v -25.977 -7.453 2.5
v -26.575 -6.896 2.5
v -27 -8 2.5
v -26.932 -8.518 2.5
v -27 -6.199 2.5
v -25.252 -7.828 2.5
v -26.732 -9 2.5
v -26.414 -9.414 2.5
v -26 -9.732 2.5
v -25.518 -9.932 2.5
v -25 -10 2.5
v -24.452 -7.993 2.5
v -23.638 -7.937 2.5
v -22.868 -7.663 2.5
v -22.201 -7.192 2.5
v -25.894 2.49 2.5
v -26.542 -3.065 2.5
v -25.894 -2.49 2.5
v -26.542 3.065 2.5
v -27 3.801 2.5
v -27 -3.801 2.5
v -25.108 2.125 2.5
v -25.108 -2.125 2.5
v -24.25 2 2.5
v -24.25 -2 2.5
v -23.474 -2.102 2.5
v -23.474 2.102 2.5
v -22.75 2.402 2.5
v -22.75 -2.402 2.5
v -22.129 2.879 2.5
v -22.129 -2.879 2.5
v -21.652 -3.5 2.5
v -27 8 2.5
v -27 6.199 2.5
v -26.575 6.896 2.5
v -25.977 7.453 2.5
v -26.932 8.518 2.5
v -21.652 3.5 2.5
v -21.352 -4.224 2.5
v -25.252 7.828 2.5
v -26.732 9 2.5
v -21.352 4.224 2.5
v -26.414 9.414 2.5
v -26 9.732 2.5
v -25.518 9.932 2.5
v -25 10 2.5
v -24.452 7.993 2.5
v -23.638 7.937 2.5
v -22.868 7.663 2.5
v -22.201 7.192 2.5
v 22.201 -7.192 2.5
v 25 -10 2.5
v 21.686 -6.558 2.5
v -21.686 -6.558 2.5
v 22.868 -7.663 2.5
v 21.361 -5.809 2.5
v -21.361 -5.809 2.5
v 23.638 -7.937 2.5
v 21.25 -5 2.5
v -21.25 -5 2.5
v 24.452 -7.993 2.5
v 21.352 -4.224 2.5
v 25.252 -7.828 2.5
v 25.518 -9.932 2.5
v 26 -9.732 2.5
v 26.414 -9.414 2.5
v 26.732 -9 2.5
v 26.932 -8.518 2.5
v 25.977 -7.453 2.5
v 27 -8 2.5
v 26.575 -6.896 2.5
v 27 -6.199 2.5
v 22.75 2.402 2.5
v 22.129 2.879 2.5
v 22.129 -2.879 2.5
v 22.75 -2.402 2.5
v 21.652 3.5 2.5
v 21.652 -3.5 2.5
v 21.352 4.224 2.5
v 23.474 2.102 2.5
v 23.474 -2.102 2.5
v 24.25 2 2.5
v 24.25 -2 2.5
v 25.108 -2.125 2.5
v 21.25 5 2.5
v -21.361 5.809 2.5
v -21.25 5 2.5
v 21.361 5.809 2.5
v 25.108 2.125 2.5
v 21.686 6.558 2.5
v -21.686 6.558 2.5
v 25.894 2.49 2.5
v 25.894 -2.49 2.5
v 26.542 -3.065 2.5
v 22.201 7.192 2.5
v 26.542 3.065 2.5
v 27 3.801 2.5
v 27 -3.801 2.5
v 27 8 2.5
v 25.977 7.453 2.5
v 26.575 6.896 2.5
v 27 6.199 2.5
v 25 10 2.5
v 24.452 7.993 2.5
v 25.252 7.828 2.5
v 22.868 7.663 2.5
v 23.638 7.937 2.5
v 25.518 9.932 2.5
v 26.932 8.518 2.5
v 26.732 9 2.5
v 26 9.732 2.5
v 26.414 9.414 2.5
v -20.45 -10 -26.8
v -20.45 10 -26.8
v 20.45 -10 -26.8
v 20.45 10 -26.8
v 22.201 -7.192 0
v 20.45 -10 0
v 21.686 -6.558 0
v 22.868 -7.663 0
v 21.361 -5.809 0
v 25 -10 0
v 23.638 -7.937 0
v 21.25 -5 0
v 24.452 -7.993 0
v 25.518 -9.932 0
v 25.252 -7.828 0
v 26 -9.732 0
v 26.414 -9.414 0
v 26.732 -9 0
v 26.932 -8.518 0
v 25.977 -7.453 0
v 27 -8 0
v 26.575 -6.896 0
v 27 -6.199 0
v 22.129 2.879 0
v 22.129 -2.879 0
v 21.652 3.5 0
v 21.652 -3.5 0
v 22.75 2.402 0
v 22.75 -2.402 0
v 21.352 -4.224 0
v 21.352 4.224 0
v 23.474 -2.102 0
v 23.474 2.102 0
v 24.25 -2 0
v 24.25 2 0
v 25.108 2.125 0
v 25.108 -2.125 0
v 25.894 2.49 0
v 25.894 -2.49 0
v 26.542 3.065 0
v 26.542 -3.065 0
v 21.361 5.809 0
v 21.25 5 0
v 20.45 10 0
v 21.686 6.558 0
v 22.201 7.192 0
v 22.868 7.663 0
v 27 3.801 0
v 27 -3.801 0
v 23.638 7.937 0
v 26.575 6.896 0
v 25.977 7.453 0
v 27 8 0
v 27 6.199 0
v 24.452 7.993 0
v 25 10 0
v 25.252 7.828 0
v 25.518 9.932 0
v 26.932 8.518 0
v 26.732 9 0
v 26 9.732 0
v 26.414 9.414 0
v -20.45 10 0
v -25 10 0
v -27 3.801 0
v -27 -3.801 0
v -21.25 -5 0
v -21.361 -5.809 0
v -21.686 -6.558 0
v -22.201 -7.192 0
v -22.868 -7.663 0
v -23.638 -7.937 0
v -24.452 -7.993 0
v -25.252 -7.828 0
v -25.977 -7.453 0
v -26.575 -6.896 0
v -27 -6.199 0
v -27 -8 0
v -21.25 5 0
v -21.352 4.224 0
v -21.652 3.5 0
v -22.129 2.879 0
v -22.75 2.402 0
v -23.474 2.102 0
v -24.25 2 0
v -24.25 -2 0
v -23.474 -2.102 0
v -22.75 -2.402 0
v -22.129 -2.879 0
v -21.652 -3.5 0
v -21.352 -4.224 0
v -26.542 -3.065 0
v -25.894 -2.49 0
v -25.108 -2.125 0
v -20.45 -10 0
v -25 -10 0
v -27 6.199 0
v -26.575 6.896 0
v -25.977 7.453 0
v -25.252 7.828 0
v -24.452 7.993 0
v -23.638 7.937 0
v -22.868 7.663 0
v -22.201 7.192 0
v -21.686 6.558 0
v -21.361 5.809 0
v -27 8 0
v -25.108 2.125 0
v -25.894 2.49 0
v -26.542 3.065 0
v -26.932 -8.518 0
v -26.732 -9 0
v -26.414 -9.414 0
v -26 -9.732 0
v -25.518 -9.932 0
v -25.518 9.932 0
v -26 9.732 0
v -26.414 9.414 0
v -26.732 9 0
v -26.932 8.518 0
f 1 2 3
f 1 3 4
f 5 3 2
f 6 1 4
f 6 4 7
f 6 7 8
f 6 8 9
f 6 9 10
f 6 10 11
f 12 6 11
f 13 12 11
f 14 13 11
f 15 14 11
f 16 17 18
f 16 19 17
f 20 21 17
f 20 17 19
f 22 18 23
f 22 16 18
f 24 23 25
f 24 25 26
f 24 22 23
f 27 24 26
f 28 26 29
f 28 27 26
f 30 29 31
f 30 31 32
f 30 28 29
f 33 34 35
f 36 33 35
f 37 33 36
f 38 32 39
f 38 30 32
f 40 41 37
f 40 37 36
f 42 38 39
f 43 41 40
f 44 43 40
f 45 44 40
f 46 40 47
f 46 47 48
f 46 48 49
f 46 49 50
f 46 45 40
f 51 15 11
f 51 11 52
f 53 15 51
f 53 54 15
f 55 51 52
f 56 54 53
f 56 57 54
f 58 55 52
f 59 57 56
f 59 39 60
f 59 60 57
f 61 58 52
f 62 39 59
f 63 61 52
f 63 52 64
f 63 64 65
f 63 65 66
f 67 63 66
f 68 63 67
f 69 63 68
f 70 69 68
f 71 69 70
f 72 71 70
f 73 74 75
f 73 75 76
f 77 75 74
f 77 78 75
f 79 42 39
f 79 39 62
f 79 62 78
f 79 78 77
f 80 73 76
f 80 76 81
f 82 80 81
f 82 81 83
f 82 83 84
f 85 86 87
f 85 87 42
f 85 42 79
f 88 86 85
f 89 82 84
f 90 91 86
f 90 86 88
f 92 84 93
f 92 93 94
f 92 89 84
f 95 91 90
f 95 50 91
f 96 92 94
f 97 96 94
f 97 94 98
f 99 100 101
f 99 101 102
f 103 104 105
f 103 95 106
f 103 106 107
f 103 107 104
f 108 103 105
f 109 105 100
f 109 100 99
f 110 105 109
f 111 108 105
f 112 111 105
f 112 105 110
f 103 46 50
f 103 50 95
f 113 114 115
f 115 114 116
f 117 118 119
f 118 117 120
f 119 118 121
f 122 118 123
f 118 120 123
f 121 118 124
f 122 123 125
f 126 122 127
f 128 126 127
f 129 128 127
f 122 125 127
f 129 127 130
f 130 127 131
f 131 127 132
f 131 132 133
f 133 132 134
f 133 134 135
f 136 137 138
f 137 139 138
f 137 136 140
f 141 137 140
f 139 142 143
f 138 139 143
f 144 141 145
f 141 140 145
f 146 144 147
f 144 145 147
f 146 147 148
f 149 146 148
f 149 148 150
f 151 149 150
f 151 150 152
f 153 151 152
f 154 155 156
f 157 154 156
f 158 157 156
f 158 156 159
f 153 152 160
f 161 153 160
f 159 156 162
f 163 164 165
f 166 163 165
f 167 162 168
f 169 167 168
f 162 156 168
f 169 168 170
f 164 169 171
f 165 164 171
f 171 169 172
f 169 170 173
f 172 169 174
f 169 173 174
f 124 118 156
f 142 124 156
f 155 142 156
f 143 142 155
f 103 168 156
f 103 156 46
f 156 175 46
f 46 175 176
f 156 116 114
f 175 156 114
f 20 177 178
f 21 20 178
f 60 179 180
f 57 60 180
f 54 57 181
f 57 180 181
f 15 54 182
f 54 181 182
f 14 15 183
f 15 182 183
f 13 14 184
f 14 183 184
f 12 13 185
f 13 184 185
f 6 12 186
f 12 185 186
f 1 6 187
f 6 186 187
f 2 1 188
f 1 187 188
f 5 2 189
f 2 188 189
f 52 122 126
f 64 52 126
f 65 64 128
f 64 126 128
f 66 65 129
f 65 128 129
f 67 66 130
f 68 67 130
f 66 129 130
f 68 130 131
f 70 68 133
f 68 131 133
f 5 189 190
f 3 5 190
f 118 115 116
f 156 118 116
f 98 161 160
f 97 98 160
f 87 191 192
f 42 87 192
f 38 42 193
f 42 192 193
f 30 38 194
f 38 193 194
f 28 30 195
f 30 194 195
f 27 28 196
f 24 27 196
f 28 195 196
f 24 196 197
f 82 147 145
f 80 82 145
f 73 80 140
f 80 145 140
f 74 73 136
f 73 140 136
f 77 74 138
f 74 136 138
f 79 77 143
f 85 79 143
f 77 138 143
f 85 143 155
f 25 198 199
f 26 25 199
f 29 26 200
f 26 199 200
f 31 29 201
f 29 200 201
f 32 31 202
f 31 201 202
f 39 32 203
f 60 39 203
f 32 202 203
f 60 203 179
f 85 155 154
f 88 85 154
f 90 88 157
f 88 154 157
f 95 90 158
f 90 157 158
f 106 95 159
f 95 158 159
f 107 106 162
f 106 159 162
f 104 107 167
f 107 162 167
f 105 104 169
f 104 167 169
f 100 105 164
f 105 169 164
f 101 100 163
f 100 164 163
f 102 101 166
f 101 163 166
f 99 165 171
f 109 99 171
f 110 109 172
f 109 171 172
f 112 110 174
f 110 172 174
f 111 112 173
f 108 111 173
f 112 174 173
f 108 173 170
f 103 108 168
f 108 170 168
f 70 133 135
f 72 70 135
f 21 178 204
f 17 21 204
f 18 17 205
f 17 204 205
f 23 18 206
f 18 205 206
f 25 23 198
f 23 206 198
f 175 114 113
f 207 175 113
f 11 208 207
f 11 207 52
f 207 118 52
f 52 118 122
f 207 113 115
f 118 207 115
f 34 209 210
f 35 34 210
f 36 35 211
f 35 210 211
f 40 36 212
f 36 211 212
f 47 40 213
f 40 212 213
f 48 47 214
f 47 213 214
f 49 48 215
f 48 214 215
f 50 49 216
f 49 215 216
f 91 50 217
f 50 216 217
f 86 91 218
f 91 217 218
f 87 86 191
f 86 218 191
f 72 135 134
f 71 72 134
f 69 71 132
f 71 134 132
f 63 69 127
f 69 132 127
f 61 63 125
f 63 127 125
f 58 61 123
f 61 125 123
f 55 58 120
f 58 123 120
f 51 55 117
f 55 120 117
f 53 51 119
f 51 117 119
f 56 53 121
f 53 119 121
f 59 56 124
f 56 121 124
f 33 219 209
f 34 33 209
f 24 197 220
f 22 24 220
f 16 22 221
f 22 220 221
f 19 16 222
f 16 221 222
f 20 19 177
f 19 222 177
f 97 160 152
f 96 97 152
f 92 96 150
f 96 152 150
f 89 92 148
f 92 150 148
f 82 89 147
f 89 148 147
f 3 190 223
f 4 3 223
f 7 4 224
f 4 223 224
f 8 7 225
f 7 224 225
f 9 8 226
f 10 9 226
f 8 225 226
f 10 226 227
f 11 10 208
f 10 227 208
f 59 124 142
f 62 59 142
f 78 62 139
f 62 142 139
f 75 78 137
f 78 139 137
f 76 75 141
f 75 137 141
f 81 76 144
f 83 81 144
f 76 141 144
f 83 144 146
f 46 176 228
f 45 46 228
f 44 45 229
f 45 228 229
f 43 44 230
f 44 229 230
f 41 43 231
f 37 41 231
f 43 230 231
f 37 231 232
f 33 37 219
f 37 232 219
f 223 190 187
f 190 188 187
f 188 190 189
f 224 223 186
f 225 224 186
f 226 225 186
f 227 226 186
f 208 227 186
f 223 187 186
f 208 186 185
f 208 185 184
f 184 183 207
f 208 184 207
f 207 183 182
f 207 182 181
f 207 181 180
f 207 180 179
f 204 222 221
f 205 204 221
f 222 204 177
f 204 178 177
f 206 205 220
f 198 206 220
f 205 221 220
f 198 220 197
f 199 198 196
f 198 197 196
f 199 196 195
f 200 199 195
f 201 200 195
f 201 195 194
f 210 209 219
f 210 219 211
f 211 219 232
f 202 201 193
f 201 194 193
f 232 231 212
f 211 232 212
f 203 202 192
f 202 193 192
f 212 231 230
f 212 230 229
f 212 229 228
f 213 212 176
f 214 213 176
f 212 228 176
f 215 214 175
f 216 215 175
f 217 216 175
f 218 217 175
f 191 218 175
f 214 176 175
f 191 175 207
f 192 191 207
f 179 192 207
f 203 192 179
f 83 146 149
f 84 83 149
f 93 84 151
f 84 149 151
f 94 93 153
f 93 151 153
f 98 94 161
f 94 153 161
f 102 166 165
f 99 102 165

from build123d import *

# Parameters (mm, degrees)
F0_W     = 40.9
F0_H     = 10
F0_H_2   = 5
F1_DEPTH = 26.8
F2_DEPTH = 2.5


with BuildPart() as f1:
    # F0 (on Top) → F1 (new body)
    with BuildSketch(Plane.XY):
        Rectangle(F0_W, F0_H)
        with Locations((0, -7.5)):
            Rectangle(F0_W, F0_H_2)
        with Locations((0, 7.5)):
            Rectangle(F0_W, F0_H_2)
    extrude(amount=-F1_DEPTH)

    # F0 (on Top) → F2 (join)
    with BuildSketch(Plane.XY):
        with BuildLine():
            Line((-21.25, 5), (-20.45, 5))
            Line((-20.45, 5), (-20.45, 10))
            Line((-20.45, 10), (-25, 10))
            ThreePointArc((-25, 10), (-26.4142135624, 9.4142135624), (-27, 8))
            Line((-27, 8), (-27, 6.1989578808))
            ThreePointArc((-27, 6.1989578808), (-23.6376275643, 7.9368350311), (-21.25, 5))
        make_face()
        with BuildLine():
            Line((-21.25, -5), (-20.45, -5))
            Line((-20.45, -5), (-20.45, 5))
            Line((-20.45, 5), (-21.25, 5))
            ThreePointArc((-21.25, 5), (-22.1286796564, 2.8786796564), (-24.25, 2))
            Line((-24.25, 2), (-24.25, -2))
            ThreePointArc((-24.25, -2), (-22.1286796564, -2.8786796564), (-21.25, -5))
        make_face()
        with BuildLine():
            ThreePointArc((-27, -3.8010421192), (-25.8936432638, -2.4903313324), (-24.25, -2))
            Line((-24.25, -2), (-24.25, 2))
            ThreePointArc((-24.25, 2), (-25.8936432638, 2.4903313324), (-27, 3.8010421192))
            Line((-27, 3.8010421192), (-27, -3.8010421192))
        make_face()
        with BuildLine():
            Line((-25, -10), (-20.45, -10))
            Line((-20.45, -10), (-20.45, -5))
            Line((-20.45, -5), (-21.25, -5))
            ThreePointArc((-21.25, -5), (-23.6376275643, -7.9368350311), (-27, -6.1989578808))
            Line((-27, -6.1989578808), (-27, -8))
            ThreePointArc((-27, -8), (-26.4142135624, -9.4142135624), (-25, -10))
        make_face()
        with Locations((0, -7.5)):
            Rectangle(F0_W, F0_H_2)
        Rectangle(F0_W, F0_H)
        with BuildLine():
            Line((20.45, -5), (20.45, -10))
            Line((20.45, -10), (25, -10))
            ThreePointArc((25, -10), (26.4142135624, -9.4142135624), (27, -8))
            Line((27, -8), (27, -6.1989578808))
            ThreePointArc((27, -6.1989578808), (23.6376275643, -7.9368350311), (21.25, -5))
            Line((21.25, -5), (20.45, -5))
        make_face()
        with Locations((0, 7.5)):
            Rectangle(F0_W, F0_H_2)
        with BuildLine():
            Line((20.45, 10), (20.45, 5))
            Line((20.45, 5), (21.25, 5))
            ThreePointArc((21.25, 5), (23.6376275643, 7.9368350311), (27, 6.1989578808))
            Line((27, 6.1989578808), (27, 8))
            ThreePointArc((27, 8), (26.4142135624, 9.4142135624), (25, 10))
            Line((25, 10), (20.45, 10))
        make_face()
        with BuildLine():
            Line((20.45, 5), (20.45, -5))
            Line((20.45, -5), (21.25, -5))
            ThreePointArc((21.25, -5), (22.1286796564, -2.8786796564), (24.25, -2))
            Line((24.25, -2), (24.25, 2))
            ThreePointArc((24.25, 2), (22.1286796564, 2.8786796564), (21.25, 5))
            Line((21.25, 5), (20.45, 5))
        make_face()
        with BuildLine():
            Line((24.25, 2), (24.25, -2))
            ThreePointArc((24.25, -2), (25.8936432638, -2.4903313324), (27, -3.8010421192))
            Line((27, -3.8010421192), (27, 3.8010421192))
            ThreePointArc((27, 3.8010421192), (25.8936432638, 2.4903313324), (24.25, 2))
        make_face()
    extrude(amount=F2_DEPTH)


solid = f1.part
